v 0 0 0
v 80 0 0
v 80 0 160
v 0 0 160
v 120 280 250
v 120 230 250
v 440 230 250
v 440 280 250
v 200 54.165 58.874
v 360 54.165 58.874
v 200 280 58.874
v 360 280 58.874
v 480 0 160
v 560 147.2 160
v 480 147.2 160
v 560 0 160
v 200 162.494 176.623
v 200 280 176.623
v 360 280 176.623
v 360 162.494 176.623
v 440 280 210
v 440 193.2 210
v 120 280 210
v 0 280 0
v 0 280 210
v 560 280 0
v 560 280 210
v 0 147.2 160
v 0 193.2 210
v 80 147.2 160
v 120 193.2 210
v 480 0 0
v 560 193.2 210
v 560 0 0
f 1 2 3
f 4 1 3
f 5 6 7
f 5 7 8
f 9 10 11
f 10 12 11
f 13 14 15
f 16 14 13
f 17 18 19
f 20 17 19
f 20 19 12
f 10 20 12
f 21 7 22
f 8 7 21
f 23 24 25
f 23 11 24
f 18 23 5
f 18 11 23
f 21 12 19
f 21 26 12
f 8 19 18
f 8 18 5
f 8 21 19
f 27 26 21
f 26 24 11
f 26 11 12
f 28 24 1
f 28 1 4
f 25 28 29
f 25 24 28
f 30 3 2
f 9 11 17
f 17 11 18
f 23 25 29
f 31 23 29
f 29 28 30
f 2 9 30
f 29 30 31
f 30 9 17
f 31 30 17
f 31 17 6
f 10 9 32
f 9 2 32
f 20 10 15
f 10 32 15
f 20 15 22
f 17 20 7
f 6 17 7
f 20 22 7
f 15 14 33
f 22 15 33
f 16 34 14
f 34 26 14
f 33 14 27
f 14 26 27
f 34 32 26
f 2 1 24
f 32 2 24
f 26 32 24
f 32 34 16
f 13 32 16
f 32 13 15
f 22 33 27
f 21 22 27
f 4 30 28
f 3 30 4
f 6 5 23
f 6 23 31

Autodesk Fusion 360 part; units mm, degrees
box "BoxPrimitive1" add length 280 width 560 height 250 placed x (0, 1, 0) y (-1, 0, 0) z (0, 0, 1) at (560, 0, 0)
sketch "Sketch2" plane through (560, 0, 0) normal (1, 0, 0) x (0, 1, 0)
  line L0 (0, 250) -> (0, 0)
  line L1 (0, 0) -> (280, 0)
  line L2 (280, 0) -> (280, 250)
  line L3 (280, 250) -> (0, 250)
  line L4 (0, 0) -> (230, 250)
  line L5 (193.2, 210) -> (280, 210)
  line L6 (147.2, 160) -> (0, 160)
  dimension "d6" = 50
  dimension "d7" = 160
  dimension "d8" = 50
extrude "Extrude1" cut sketch "Sketch2" against normal blind 560 contours L0 L3 L4 L6
extrude "Extrude2" cut sketch "Sketch2" against normal blind 400 from surface at -80 contours L0 L4 L6
extrude "Extrude3" cut sketch "Sketch2" against normal blind 120 contours L2 L3 L4 L5
ref_plane "WorkPlane1" through (280, 140, 105) normal (1, 0, 0) x (0, 0, -1)
mirror "Mirror1" about plane through (280, 140, 105) normal (1, 0, 0) of "Extrude3"
sketch "Sketch3" plane through (0, 0, 0) normal (0, -0.735931, 0.677057) x (1, 0, 0)
  line L0 (120, 285.3528) -> (0, 285.3528)
  line L1 (0, 285.3528) -> (0, 217.4117)
  line L2 (0, 217.4117) -> (80, 217.4117)
  line L3 (80, 217.4117) -> (80, 0)
  line L4 (80, 0) -> (480, 0)
  line L5 (480, 0) -> (480, 217.4117)
  line L6 (480, 217.4117) -> (560, 217.4117)
  line L7 (560, 217.4117) -> (560, 285.3528)
  line L8 (560, 285.3528) -> (440, 285.3528)
  line L9 (440, 285.3528) -> (440, 339.7058)
  line L10 (440, 339.7058) -> (120, 339.7058)
  line L11 (120, 339.7058) -> (120, 285.3528)
  line L12 (360, 80) -> (200, 80)
  line L13 (200, 80) -> (200, 240)
  line L14 (200, 240) -> (360, 240)
  line L15 (360, 240) -> (360, 80)
  line L16 (360, 80) -> (200, 240) construction
  line L17 (200, 80) -> (360, 240) construction
  point P0 (280, 160)
  dimension "d18" = 160
  dimension "d19" = 160
  dimension "d20" = 80
  dimension "d21" = 120
sketch "Sketch4" plane through (0, 280, 0) normal (0, 1, 0) x (-1, 0, 0)
  line L0 (0, 210) -> (-120, 210)
  line L1 (-120, 210) -> (-120, 250)
  line L2 (-120, 250) -> (-440, 250)
  line L3 (-440, 250) -> (-440, 210)
  line L4 (-440, 210) -> (-560, 210)
  line L5 (-560, 210) -> (-560, 0)
  line L6 (-560, 0) -> (0, 0)
  line L7 (0, 0) -> (0, 210)
  line L8 (-200, 58.8745) -> (-200, 176.6234)
  line L9 (-200, 176.6234) -> (-360, 176.6234)
  line L10 (-360, 58.8745) -> (-200, 58.8745)
  line L11 (-360, 176.6234) -> (-360, 58.8745)
extrude "Extrude4" cut sketch "Sketch4" against normal blind 300 contours L8 L9 L10 L11
